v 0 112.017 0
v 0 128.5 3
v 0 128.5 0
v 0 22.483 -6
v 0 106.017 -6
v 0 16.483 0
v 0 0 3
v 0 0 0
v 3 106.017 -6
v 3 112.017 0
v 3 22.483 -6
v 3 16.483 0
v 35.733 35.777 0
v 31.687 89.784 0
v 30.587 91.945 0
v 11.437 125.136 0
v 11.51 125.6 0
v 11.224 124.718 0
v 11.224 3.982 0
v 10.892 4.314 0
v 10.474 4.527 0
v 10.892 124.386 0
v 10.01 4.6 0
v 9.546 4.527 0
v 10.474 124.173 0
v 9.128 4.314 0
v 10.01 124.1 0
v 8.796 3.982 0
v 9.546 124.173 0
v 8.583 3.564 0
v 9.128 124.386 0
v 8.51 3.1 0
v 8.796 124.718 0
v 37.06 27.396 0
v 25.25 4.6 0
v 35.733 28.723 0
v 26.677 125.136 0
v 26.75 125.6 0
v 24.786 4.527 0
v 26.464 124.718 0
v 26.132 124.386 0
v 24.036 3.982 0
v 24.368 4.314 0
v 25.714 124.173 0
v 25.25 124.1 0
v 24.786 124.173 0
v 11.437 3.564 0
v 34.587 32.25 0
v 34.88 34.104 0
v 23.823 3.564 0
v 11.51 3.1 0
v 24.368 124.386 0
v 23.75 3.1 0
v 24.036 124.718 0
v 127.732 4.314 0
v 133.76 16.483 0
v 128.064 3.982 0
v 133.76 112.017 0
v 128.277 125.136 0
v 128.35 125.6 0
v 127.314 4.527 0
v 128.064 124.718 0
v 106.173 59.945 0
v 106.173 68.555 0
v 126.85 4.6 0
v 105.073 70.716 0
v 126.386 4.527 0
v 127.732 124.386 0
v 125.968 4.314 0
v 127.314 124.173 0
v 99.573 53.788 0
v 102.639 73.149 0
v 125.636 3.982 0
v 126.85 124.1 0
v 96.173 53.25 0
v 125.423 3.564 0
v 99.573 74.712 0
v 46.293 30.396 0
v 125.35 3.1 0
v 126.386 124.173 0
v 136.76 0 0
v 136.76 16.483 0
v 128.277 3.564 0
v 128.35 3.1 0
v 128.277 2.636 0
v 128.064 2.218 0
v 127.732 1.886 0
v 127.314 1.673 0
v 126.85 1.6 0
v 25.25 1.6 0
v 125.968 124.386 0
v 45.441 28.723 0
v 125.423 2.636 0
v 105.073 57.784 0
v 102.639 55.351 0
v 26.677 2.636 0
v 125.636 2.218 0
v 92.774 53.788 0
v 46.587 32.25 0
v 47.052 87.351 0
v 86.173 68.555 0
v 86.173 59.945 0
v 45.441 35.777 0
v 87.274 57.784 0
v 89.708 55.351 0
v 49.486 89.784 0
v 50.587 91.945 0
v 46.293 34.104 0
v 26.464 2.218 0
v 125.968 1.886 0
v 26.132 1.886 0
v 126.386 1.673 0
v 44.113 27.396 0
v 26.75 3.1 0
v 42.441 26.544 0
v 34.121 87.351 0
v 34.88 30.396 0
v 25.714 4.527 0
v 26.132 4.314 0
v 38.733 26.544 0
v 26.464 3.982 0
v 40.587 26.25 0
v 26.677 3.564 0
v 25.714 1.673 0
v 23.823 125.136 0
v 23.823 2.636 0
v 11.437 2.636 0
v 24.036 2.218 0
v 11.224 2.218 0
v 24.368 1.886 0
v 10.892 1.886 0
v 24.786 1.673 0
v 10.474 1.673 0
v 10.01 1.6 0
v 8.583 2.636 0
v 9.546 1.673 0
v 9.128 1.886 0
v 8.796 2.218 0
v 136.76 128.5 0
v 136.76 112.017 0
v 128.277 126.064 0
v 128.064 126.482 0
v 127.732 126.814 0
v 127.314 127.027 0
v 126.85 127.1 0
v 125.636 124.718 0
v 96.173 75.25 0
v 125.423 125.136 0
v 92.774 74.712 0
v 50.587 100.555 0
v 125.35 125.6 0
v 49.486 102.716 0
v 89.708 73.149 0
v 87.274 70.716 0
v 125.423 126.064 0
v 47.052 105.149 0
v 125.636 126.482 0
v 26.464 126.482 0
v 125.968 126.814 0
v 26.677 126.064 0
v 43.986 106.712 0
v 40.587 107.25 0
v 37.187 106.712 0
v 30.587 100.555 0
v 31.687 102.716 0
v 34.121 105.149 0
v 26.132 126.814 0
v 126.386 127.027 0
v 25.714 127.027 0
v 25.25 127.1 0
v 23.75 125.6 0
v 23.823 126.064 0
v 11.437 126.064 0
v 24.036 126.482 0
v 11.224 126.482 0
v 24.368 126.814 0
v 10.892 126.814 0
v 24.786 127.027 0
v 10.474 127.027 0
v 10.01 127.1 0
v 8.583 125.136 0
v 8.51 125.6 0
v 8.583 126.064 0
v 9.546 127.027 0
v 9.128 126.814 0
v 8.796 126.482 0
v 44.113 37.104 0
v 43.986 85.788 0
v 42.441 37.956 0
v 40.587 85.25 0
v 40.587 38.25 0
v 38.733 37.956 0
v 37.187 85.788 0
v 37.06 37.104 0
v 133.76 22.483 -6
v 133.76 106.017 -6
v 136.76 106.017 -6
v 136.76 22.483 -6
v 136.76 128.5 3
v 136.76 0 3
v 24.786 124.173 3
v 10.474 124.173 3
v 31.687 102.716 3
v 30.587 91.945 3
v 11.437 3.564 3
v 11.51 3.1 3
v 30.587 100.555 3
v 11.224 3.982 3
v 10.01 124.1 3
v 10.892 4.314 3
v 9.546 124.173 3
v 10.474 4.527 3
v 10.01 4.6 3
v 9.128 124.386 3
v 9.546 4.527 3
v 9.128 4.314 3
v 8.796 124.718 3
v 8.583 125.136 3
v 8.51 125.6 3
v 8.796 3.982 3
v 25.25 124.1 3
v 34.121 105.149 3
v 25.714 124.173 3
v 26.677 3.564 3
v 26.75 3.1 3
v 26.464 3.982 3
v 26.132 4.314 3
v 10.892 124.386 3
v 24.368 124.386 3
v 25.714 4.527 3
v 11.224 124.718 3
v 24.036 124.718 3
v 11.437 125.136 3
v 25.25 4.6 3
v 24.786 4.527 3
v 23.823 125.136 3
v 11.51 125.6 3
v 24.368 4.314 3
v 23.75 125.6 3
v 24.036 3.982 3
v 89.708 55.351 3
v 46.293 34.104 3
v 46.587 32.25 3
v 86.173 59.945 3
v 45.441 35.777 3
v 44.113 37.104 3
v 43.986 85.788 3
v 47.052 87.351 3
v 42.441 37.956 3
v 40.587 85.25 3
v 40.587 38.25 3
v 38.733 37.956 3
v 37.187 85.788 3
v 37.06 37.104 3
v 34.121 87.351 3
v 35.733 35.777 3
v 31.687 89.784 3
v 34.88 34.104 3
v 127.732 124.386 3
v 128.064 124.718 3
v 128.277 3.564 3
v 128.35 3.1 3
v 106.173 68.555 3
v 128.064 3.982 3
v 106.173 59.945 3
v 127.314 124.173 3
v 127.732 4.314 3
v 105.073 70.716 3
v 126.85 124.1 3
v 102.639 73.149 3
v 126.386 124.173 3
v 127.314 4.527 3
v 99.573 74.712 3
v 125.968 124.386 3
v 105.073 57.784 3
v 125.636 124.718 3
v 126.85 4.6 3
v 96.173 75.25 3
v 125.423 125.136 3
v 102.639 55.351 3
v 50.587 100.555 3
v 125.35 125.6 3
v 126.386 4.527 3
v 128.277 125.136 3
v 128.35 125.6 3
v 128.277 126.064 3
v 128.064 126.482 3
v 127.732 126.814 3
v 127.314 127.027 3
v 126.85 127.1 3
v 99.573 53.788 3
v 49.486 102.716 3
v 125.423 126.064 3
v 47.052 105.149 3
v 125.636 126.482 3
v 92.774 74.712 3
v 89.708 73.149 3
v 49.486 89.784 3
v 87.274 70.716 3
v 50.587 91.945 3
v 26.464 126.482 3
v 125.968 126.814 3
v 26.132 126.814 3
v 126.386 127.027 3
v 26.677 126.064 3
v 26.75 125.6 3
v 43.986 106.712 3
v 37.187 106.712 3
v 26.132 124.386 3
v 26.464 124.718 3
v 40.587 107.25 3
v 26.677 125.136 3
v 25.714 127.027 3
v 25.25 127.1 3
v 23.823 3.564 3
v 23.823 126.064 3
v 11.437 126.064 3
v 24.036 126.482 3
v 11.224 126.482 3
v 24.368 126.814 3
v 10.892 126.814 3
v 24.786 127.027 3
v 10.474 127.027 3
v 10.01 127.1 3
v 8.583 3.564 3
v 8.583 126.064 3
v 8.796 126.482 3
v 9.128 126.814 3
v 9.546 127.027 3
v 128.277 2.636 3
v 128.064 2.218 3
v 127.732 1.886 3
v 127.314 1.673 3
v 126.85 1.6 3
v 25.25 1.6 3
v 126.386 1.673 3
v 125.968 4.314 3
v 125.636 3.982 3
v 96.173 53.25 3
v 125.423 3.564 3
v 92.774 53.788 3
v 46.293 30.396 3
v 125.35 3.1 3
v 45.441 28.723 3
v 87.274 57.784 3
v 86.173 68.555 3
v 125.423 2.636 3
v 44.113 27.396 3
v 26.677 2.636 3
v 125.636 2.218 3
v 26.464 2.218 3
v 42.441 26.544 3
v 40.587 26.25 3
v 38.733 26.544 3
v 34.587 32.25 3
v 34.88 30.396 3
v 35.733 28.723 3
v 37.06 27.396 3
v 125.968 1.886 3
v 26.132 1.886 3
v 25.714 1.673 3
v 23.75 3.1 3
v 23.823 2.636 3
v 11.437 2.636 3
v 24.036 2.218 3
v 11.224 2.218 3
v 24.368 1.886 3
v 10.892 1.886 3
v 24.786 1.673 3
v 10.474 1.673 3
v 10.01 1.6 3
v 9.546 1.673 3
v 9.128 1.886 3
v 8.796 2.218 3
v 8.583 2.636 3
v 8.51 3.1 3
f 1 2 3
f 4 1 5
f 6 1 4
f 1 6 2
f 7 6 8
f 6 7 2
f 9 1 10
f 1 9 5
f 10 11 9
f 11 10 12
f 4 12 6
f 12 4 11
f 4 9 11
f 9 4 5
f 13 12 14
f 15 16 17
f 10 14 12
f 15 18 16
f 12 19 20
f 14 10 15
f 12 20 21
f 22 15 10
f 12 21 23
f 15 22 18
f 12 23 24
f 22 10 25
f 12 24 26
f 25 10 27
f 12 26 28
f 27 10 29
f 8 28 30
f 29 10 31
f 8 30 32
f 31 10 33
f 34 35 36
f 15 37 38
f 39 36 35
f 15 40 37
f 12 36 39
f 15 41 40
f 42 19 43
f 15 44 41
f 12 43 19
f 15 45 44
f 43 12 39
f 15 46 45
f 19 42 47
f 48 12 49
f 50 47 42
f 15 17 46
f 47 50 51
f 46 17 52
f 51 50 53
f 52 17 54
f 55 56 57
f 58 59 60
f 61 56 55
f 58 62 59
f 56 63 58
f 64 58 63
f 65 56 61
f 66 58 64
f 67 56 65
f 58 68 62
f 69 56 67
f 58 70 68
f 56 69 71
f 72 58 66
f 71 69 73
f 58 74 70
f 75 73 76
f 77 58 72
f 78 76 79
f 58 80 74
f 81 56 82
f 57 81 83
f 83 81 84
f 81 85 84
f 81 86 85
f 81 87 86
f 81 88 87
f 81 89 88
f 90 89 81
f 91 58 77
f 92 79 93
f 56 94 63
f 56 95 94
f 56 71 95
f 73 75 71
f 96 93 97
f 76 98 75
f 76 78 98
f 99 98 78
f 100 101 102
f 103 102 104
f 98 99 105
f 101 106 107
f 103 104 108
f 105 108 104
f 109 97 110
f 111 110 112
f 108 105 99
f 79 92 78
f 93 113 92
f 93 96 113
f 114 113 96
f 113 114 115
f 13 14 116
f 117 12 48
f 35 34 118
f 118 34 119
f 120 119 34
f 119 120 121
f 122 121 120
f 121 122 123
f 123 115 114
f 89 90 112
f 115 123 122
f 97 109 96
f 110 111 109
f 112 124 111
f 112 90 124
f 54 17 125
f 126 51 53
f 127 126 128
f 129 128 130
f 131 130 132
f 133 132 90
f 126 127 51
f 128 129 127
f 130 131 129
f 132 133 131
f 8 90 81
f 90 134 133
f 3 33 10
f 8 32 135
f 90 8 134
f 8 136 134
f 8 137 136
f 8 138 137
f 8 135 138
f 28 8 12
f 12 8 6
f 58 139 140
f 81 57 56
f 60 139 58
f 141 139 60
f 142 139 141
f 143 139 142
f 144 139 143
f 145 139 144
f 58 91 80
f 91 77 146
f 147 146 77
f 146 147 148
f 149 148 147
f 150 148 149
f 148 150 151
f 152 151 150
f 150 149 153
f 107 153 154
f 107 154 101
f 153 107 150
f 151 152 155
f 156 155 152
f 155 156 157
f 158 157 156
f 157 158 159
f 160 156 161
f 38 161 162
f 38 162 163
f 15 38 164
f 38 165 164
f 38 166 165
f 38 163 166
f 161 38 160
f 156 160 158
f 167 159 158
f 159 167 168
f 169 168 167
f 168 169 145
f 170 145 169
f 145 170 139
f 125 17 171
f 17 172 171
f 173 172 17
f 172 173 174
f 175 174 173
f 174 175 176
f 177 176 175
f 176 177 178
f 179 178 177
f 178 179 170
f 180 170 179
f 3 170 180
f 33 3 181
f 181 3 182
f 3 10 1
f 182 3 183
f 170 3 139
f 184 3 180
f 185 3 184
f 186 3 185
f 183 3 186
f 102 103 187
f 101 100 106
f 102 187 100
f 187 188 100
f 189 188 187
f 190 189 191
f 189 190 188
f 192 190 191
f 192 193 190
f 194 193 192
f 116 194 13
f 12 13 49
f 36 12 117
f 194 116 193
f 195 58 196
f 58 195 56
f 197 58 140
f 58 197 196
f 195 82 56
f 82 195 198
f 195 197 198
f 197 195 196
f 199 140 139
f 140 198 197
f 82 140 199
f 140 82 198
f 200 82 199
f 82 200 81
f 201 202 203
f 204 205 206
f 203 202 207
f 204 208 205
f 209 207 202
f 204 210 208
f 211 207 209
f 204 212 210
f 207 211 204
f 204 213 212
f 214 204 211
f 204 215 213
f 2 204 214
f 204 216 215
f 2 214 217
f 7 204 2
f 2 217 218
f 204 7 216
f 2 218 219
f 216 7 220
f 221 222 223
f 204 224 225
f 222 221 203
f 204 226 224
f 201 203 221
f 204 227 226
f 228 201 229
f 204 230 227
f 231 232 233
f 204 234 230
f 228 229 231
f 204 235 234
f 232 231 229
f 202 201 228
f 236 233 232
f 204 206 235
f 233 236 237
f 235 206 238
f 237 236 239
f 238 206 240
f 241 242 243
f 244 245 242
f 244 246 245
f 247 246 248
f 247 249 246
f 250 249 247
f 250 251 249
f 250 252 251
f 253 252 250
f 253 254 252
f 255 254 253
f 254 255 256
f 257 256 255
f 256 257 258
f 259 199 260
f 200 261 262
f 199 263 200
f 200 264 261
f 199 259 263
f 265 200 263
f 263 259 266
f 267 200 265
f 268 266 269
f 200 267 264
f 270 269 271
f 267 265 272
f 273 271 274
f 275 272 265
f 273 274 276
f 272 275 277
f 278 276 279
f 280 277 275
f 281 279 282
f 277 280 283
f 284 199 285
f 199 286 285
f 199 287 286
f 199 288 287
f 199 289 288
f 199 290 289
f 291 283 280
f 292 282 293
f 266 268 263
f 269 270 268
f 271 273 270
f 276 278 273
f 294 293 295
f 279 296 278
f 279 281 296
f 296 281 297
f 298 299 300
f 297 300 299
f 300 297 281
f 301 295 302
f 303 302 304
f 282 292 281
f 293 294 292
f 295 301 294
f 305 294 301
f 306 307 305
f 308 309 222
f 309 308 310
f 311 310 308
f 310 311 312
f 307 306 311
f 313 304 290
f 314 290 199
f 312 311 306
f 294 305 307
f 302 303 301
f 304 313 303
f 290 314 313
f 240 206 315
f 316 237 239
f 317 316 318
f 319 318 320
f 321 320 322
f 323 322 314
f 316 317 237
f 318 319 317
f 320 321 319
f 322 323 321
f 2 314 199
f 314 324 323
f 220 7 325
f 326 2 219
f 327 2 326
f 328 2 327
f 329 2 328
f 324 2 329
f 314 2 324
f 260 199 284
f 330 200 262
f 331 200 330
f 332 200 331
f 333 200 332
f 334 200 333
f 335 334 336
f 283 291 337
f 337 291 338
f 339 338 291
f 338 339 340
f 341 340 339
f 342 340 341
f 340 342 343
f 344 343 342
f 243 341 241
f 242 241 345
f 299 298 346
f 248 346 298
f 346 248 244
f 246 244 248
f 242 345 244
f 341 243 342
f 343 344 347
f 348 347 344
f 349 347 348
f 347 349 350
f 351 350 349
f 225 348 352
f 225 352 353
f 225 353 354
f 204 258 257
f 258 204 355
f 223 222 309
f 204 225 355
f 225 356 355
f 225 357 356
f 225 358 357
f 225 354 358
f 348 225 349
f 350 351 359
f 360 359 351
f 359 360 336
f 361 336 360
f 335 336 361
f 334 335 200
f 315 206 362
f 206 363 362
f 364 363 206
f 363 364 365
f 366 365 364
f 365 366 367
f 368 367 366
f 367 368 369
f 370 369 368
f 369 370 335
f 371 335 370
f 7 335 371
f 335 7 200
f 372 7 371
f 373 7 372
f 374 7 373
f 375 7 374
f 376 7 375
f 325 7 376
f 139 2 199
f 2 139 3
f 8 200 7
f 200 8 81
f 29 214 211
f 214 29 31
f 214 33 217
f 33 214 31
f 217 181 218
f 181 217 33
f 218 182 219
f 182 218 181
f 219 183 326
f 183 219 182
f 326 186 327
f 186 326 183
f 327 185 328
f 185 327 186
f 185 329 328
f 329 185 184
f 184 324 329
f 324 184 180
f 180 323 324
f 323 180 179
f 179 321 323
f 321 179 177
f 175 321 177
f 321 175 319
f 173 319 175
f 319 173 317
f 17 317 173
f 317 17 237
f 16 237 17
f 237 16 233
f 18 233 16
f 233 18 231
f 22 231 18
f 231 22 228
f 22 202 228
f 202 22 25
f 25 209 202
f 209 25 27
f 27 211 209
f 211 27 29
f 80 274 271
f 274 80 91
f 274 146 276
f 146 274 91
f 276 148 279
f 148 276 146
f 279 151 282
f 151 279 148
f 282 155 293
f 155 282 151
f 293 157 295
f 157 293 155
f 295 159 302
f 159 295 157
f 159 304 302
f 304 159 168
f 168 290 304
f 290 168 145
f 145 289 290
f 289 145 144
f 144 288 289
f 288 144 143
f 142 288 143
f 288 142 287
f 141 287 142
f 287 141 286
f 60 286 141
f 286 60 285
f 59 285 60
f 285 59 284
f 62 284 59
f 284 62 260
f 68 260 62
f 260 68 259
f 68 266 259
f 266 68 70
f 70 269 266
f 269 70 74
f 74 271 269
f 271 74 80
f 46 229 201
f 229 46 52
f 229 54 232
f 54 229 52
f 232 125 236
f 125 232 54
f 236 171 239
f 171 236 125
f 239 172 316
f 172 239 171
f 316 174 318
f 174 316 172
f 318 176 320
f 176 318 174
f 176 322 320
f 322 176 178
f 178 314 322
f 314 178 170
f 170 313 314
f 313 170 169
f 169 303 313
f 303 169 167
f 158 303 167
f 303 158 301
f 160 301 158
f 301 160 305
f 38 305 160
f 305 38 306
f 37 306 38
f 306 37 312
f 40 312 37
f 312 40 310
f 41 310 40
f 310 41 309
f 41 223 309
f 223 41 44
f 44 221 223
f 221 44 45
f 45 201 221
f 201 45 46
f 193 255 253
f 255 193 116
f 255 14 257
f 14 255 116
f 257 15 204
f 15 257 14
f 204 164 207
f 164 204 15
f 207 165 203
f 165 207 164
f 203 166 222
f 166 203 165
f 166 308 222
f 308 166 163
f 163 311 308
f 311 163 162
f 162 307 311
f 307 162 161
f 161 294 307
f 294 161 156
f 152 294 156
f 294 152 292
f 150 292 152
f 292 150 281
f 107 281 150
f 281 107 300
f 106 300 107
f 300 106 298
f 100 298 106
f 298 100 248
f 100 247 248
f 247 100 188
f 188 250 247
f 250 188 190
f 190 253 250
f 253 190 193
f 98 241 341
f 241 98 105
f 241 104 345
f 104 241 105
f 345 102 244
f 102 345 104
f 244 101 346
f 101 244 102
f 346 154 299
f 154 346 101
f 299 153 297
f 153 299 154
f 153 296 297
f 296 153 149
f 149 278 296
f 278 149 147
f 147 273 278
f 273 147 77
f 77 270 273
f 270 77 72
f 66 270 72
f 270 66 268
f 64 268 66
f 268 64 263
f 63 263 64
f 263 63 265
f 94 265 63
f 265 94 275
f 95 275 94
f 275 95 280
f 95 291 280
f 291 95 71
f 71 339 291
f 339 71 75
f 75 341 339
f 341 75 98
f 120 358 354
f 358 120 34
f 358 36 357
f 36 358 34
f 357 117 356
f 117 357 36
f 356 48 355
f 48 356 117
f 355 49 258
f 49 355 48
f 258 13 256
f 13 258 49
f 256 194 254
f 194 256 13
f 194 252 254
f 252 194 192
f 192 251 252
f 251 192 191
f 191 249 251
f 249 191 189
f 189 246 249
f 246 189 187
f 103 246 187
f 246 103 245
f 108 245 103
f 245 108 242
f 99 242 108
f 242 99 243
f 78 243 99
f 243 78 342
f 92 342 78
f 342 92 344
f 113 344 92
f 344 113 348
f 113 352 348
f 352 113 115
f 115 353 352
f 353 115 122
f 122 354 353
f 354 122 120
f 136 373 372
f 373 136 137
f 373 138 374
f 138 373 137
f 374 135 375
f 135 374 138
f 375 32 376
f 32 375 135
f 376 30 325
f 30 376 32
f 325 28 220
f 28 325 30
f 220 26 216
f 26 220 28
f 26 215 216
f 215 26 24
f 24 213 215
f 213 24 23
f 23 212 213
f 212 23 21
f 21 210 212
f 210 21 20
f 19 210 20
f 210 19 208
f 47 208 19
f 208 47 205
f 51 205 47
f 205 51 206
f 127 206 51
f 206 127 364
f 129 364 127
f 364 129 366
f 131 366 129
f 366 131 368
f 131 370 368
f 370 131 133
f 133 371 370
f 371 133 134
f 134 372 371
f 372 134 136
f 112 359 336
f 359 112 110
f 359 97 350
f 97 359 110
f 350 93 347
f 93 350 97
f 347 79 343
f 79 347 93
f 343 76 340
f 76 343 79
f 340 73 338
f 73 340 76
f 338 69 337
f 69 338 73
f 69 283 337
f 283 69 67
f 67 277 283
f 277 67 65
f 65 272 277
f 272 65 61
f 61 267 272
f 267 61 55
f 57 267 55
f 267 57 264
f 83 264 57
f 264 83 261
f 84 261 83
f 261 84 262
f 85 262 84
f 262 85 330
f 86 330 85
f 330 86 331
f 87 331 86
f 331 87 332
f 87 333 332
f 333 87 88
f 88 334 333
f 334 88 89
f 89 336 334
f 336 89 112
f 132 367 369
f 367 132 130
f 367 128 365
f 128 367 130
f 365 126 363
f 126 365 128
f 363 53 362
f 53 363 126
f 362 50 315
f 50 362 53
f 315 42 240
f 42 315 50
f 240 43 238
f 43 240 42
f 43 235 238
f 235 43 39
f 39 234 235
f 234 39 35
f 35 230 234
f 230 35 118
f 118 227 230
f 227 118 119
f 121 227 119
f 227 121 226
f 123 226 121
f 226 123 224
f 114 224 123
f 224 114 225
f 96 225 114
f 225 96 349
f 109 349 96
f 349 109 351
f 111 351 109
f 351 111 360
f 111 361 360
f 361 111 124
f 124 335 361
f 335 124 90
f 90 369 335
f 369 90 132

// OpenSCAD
// file: panel.scad
$fn = 20;
U = 3;
T = 16;

h = U * 44.5 - 5;
w = T * 5.08 - 2*.2;

m_x = 7.47;
//m_x = 0;
m_y = 3.1;
m_d = 3;

F = U * 44.5 + (122.5 - 3 * 44.5);

echo(w);

module hole() {
//    hull() {
    //circle(d=m_d);
    translate([5.08/2,0]) circle(d=m_d);
//    }
}

module holes() {
    translate([m_x, m_y]) hole();
    translate([m_x, m_y + F]) hole();
}

module panel() {
    difference() {
    square([w, h]);
        holes();
        if(T>6) {
            translate([(T-3) * 5.08 - 5.08, 0]) holes();
        }
        translate([(T-24) * 5.08, 0]) holes();
    }
}

//panel();

//#square([46,62]);
//#import("jr-module-bay-cover.stl");
// main file
b_w = 13;
b_h = 20;

include <panel.scad>

T = 27;
U = 3;

difference() {
    linear_extrude(3)
    difference() {
    panel();
    
    // IGNITION
    translate([w/3-5,h/2-32])
    intersection() {
        circle(d=12, true);
        square([20,22],true);
    }
    
    // ARM TANK
    translate([2/3*w+5,h/2])
    intersection() {
        circle(d=22, true);
        square([20,22],true);
    }
    
    // TANK VENT
    translate([w/3-5,h/2+32])
    intersection() {
        circle(d=22, true);
        square([20,22],true);
    }

    }

}

intersection() {
    translate([0,h/2,40])
    rotate([0,90,0])
    linear_extrude(3)
    circle(d=h, $fn=12);
    
    translate([0,0,-6])
    linear_extrude(6)
    panel(); 
}

intersection() {
    translate([w-3,h/2,40])
    rotate([0,90,0])
    linear_extrude(3)
    circle(d=h, $fn=12);
    
    translate([0,0,-6])
    linear_extrude(6)
    panel(); 
}
